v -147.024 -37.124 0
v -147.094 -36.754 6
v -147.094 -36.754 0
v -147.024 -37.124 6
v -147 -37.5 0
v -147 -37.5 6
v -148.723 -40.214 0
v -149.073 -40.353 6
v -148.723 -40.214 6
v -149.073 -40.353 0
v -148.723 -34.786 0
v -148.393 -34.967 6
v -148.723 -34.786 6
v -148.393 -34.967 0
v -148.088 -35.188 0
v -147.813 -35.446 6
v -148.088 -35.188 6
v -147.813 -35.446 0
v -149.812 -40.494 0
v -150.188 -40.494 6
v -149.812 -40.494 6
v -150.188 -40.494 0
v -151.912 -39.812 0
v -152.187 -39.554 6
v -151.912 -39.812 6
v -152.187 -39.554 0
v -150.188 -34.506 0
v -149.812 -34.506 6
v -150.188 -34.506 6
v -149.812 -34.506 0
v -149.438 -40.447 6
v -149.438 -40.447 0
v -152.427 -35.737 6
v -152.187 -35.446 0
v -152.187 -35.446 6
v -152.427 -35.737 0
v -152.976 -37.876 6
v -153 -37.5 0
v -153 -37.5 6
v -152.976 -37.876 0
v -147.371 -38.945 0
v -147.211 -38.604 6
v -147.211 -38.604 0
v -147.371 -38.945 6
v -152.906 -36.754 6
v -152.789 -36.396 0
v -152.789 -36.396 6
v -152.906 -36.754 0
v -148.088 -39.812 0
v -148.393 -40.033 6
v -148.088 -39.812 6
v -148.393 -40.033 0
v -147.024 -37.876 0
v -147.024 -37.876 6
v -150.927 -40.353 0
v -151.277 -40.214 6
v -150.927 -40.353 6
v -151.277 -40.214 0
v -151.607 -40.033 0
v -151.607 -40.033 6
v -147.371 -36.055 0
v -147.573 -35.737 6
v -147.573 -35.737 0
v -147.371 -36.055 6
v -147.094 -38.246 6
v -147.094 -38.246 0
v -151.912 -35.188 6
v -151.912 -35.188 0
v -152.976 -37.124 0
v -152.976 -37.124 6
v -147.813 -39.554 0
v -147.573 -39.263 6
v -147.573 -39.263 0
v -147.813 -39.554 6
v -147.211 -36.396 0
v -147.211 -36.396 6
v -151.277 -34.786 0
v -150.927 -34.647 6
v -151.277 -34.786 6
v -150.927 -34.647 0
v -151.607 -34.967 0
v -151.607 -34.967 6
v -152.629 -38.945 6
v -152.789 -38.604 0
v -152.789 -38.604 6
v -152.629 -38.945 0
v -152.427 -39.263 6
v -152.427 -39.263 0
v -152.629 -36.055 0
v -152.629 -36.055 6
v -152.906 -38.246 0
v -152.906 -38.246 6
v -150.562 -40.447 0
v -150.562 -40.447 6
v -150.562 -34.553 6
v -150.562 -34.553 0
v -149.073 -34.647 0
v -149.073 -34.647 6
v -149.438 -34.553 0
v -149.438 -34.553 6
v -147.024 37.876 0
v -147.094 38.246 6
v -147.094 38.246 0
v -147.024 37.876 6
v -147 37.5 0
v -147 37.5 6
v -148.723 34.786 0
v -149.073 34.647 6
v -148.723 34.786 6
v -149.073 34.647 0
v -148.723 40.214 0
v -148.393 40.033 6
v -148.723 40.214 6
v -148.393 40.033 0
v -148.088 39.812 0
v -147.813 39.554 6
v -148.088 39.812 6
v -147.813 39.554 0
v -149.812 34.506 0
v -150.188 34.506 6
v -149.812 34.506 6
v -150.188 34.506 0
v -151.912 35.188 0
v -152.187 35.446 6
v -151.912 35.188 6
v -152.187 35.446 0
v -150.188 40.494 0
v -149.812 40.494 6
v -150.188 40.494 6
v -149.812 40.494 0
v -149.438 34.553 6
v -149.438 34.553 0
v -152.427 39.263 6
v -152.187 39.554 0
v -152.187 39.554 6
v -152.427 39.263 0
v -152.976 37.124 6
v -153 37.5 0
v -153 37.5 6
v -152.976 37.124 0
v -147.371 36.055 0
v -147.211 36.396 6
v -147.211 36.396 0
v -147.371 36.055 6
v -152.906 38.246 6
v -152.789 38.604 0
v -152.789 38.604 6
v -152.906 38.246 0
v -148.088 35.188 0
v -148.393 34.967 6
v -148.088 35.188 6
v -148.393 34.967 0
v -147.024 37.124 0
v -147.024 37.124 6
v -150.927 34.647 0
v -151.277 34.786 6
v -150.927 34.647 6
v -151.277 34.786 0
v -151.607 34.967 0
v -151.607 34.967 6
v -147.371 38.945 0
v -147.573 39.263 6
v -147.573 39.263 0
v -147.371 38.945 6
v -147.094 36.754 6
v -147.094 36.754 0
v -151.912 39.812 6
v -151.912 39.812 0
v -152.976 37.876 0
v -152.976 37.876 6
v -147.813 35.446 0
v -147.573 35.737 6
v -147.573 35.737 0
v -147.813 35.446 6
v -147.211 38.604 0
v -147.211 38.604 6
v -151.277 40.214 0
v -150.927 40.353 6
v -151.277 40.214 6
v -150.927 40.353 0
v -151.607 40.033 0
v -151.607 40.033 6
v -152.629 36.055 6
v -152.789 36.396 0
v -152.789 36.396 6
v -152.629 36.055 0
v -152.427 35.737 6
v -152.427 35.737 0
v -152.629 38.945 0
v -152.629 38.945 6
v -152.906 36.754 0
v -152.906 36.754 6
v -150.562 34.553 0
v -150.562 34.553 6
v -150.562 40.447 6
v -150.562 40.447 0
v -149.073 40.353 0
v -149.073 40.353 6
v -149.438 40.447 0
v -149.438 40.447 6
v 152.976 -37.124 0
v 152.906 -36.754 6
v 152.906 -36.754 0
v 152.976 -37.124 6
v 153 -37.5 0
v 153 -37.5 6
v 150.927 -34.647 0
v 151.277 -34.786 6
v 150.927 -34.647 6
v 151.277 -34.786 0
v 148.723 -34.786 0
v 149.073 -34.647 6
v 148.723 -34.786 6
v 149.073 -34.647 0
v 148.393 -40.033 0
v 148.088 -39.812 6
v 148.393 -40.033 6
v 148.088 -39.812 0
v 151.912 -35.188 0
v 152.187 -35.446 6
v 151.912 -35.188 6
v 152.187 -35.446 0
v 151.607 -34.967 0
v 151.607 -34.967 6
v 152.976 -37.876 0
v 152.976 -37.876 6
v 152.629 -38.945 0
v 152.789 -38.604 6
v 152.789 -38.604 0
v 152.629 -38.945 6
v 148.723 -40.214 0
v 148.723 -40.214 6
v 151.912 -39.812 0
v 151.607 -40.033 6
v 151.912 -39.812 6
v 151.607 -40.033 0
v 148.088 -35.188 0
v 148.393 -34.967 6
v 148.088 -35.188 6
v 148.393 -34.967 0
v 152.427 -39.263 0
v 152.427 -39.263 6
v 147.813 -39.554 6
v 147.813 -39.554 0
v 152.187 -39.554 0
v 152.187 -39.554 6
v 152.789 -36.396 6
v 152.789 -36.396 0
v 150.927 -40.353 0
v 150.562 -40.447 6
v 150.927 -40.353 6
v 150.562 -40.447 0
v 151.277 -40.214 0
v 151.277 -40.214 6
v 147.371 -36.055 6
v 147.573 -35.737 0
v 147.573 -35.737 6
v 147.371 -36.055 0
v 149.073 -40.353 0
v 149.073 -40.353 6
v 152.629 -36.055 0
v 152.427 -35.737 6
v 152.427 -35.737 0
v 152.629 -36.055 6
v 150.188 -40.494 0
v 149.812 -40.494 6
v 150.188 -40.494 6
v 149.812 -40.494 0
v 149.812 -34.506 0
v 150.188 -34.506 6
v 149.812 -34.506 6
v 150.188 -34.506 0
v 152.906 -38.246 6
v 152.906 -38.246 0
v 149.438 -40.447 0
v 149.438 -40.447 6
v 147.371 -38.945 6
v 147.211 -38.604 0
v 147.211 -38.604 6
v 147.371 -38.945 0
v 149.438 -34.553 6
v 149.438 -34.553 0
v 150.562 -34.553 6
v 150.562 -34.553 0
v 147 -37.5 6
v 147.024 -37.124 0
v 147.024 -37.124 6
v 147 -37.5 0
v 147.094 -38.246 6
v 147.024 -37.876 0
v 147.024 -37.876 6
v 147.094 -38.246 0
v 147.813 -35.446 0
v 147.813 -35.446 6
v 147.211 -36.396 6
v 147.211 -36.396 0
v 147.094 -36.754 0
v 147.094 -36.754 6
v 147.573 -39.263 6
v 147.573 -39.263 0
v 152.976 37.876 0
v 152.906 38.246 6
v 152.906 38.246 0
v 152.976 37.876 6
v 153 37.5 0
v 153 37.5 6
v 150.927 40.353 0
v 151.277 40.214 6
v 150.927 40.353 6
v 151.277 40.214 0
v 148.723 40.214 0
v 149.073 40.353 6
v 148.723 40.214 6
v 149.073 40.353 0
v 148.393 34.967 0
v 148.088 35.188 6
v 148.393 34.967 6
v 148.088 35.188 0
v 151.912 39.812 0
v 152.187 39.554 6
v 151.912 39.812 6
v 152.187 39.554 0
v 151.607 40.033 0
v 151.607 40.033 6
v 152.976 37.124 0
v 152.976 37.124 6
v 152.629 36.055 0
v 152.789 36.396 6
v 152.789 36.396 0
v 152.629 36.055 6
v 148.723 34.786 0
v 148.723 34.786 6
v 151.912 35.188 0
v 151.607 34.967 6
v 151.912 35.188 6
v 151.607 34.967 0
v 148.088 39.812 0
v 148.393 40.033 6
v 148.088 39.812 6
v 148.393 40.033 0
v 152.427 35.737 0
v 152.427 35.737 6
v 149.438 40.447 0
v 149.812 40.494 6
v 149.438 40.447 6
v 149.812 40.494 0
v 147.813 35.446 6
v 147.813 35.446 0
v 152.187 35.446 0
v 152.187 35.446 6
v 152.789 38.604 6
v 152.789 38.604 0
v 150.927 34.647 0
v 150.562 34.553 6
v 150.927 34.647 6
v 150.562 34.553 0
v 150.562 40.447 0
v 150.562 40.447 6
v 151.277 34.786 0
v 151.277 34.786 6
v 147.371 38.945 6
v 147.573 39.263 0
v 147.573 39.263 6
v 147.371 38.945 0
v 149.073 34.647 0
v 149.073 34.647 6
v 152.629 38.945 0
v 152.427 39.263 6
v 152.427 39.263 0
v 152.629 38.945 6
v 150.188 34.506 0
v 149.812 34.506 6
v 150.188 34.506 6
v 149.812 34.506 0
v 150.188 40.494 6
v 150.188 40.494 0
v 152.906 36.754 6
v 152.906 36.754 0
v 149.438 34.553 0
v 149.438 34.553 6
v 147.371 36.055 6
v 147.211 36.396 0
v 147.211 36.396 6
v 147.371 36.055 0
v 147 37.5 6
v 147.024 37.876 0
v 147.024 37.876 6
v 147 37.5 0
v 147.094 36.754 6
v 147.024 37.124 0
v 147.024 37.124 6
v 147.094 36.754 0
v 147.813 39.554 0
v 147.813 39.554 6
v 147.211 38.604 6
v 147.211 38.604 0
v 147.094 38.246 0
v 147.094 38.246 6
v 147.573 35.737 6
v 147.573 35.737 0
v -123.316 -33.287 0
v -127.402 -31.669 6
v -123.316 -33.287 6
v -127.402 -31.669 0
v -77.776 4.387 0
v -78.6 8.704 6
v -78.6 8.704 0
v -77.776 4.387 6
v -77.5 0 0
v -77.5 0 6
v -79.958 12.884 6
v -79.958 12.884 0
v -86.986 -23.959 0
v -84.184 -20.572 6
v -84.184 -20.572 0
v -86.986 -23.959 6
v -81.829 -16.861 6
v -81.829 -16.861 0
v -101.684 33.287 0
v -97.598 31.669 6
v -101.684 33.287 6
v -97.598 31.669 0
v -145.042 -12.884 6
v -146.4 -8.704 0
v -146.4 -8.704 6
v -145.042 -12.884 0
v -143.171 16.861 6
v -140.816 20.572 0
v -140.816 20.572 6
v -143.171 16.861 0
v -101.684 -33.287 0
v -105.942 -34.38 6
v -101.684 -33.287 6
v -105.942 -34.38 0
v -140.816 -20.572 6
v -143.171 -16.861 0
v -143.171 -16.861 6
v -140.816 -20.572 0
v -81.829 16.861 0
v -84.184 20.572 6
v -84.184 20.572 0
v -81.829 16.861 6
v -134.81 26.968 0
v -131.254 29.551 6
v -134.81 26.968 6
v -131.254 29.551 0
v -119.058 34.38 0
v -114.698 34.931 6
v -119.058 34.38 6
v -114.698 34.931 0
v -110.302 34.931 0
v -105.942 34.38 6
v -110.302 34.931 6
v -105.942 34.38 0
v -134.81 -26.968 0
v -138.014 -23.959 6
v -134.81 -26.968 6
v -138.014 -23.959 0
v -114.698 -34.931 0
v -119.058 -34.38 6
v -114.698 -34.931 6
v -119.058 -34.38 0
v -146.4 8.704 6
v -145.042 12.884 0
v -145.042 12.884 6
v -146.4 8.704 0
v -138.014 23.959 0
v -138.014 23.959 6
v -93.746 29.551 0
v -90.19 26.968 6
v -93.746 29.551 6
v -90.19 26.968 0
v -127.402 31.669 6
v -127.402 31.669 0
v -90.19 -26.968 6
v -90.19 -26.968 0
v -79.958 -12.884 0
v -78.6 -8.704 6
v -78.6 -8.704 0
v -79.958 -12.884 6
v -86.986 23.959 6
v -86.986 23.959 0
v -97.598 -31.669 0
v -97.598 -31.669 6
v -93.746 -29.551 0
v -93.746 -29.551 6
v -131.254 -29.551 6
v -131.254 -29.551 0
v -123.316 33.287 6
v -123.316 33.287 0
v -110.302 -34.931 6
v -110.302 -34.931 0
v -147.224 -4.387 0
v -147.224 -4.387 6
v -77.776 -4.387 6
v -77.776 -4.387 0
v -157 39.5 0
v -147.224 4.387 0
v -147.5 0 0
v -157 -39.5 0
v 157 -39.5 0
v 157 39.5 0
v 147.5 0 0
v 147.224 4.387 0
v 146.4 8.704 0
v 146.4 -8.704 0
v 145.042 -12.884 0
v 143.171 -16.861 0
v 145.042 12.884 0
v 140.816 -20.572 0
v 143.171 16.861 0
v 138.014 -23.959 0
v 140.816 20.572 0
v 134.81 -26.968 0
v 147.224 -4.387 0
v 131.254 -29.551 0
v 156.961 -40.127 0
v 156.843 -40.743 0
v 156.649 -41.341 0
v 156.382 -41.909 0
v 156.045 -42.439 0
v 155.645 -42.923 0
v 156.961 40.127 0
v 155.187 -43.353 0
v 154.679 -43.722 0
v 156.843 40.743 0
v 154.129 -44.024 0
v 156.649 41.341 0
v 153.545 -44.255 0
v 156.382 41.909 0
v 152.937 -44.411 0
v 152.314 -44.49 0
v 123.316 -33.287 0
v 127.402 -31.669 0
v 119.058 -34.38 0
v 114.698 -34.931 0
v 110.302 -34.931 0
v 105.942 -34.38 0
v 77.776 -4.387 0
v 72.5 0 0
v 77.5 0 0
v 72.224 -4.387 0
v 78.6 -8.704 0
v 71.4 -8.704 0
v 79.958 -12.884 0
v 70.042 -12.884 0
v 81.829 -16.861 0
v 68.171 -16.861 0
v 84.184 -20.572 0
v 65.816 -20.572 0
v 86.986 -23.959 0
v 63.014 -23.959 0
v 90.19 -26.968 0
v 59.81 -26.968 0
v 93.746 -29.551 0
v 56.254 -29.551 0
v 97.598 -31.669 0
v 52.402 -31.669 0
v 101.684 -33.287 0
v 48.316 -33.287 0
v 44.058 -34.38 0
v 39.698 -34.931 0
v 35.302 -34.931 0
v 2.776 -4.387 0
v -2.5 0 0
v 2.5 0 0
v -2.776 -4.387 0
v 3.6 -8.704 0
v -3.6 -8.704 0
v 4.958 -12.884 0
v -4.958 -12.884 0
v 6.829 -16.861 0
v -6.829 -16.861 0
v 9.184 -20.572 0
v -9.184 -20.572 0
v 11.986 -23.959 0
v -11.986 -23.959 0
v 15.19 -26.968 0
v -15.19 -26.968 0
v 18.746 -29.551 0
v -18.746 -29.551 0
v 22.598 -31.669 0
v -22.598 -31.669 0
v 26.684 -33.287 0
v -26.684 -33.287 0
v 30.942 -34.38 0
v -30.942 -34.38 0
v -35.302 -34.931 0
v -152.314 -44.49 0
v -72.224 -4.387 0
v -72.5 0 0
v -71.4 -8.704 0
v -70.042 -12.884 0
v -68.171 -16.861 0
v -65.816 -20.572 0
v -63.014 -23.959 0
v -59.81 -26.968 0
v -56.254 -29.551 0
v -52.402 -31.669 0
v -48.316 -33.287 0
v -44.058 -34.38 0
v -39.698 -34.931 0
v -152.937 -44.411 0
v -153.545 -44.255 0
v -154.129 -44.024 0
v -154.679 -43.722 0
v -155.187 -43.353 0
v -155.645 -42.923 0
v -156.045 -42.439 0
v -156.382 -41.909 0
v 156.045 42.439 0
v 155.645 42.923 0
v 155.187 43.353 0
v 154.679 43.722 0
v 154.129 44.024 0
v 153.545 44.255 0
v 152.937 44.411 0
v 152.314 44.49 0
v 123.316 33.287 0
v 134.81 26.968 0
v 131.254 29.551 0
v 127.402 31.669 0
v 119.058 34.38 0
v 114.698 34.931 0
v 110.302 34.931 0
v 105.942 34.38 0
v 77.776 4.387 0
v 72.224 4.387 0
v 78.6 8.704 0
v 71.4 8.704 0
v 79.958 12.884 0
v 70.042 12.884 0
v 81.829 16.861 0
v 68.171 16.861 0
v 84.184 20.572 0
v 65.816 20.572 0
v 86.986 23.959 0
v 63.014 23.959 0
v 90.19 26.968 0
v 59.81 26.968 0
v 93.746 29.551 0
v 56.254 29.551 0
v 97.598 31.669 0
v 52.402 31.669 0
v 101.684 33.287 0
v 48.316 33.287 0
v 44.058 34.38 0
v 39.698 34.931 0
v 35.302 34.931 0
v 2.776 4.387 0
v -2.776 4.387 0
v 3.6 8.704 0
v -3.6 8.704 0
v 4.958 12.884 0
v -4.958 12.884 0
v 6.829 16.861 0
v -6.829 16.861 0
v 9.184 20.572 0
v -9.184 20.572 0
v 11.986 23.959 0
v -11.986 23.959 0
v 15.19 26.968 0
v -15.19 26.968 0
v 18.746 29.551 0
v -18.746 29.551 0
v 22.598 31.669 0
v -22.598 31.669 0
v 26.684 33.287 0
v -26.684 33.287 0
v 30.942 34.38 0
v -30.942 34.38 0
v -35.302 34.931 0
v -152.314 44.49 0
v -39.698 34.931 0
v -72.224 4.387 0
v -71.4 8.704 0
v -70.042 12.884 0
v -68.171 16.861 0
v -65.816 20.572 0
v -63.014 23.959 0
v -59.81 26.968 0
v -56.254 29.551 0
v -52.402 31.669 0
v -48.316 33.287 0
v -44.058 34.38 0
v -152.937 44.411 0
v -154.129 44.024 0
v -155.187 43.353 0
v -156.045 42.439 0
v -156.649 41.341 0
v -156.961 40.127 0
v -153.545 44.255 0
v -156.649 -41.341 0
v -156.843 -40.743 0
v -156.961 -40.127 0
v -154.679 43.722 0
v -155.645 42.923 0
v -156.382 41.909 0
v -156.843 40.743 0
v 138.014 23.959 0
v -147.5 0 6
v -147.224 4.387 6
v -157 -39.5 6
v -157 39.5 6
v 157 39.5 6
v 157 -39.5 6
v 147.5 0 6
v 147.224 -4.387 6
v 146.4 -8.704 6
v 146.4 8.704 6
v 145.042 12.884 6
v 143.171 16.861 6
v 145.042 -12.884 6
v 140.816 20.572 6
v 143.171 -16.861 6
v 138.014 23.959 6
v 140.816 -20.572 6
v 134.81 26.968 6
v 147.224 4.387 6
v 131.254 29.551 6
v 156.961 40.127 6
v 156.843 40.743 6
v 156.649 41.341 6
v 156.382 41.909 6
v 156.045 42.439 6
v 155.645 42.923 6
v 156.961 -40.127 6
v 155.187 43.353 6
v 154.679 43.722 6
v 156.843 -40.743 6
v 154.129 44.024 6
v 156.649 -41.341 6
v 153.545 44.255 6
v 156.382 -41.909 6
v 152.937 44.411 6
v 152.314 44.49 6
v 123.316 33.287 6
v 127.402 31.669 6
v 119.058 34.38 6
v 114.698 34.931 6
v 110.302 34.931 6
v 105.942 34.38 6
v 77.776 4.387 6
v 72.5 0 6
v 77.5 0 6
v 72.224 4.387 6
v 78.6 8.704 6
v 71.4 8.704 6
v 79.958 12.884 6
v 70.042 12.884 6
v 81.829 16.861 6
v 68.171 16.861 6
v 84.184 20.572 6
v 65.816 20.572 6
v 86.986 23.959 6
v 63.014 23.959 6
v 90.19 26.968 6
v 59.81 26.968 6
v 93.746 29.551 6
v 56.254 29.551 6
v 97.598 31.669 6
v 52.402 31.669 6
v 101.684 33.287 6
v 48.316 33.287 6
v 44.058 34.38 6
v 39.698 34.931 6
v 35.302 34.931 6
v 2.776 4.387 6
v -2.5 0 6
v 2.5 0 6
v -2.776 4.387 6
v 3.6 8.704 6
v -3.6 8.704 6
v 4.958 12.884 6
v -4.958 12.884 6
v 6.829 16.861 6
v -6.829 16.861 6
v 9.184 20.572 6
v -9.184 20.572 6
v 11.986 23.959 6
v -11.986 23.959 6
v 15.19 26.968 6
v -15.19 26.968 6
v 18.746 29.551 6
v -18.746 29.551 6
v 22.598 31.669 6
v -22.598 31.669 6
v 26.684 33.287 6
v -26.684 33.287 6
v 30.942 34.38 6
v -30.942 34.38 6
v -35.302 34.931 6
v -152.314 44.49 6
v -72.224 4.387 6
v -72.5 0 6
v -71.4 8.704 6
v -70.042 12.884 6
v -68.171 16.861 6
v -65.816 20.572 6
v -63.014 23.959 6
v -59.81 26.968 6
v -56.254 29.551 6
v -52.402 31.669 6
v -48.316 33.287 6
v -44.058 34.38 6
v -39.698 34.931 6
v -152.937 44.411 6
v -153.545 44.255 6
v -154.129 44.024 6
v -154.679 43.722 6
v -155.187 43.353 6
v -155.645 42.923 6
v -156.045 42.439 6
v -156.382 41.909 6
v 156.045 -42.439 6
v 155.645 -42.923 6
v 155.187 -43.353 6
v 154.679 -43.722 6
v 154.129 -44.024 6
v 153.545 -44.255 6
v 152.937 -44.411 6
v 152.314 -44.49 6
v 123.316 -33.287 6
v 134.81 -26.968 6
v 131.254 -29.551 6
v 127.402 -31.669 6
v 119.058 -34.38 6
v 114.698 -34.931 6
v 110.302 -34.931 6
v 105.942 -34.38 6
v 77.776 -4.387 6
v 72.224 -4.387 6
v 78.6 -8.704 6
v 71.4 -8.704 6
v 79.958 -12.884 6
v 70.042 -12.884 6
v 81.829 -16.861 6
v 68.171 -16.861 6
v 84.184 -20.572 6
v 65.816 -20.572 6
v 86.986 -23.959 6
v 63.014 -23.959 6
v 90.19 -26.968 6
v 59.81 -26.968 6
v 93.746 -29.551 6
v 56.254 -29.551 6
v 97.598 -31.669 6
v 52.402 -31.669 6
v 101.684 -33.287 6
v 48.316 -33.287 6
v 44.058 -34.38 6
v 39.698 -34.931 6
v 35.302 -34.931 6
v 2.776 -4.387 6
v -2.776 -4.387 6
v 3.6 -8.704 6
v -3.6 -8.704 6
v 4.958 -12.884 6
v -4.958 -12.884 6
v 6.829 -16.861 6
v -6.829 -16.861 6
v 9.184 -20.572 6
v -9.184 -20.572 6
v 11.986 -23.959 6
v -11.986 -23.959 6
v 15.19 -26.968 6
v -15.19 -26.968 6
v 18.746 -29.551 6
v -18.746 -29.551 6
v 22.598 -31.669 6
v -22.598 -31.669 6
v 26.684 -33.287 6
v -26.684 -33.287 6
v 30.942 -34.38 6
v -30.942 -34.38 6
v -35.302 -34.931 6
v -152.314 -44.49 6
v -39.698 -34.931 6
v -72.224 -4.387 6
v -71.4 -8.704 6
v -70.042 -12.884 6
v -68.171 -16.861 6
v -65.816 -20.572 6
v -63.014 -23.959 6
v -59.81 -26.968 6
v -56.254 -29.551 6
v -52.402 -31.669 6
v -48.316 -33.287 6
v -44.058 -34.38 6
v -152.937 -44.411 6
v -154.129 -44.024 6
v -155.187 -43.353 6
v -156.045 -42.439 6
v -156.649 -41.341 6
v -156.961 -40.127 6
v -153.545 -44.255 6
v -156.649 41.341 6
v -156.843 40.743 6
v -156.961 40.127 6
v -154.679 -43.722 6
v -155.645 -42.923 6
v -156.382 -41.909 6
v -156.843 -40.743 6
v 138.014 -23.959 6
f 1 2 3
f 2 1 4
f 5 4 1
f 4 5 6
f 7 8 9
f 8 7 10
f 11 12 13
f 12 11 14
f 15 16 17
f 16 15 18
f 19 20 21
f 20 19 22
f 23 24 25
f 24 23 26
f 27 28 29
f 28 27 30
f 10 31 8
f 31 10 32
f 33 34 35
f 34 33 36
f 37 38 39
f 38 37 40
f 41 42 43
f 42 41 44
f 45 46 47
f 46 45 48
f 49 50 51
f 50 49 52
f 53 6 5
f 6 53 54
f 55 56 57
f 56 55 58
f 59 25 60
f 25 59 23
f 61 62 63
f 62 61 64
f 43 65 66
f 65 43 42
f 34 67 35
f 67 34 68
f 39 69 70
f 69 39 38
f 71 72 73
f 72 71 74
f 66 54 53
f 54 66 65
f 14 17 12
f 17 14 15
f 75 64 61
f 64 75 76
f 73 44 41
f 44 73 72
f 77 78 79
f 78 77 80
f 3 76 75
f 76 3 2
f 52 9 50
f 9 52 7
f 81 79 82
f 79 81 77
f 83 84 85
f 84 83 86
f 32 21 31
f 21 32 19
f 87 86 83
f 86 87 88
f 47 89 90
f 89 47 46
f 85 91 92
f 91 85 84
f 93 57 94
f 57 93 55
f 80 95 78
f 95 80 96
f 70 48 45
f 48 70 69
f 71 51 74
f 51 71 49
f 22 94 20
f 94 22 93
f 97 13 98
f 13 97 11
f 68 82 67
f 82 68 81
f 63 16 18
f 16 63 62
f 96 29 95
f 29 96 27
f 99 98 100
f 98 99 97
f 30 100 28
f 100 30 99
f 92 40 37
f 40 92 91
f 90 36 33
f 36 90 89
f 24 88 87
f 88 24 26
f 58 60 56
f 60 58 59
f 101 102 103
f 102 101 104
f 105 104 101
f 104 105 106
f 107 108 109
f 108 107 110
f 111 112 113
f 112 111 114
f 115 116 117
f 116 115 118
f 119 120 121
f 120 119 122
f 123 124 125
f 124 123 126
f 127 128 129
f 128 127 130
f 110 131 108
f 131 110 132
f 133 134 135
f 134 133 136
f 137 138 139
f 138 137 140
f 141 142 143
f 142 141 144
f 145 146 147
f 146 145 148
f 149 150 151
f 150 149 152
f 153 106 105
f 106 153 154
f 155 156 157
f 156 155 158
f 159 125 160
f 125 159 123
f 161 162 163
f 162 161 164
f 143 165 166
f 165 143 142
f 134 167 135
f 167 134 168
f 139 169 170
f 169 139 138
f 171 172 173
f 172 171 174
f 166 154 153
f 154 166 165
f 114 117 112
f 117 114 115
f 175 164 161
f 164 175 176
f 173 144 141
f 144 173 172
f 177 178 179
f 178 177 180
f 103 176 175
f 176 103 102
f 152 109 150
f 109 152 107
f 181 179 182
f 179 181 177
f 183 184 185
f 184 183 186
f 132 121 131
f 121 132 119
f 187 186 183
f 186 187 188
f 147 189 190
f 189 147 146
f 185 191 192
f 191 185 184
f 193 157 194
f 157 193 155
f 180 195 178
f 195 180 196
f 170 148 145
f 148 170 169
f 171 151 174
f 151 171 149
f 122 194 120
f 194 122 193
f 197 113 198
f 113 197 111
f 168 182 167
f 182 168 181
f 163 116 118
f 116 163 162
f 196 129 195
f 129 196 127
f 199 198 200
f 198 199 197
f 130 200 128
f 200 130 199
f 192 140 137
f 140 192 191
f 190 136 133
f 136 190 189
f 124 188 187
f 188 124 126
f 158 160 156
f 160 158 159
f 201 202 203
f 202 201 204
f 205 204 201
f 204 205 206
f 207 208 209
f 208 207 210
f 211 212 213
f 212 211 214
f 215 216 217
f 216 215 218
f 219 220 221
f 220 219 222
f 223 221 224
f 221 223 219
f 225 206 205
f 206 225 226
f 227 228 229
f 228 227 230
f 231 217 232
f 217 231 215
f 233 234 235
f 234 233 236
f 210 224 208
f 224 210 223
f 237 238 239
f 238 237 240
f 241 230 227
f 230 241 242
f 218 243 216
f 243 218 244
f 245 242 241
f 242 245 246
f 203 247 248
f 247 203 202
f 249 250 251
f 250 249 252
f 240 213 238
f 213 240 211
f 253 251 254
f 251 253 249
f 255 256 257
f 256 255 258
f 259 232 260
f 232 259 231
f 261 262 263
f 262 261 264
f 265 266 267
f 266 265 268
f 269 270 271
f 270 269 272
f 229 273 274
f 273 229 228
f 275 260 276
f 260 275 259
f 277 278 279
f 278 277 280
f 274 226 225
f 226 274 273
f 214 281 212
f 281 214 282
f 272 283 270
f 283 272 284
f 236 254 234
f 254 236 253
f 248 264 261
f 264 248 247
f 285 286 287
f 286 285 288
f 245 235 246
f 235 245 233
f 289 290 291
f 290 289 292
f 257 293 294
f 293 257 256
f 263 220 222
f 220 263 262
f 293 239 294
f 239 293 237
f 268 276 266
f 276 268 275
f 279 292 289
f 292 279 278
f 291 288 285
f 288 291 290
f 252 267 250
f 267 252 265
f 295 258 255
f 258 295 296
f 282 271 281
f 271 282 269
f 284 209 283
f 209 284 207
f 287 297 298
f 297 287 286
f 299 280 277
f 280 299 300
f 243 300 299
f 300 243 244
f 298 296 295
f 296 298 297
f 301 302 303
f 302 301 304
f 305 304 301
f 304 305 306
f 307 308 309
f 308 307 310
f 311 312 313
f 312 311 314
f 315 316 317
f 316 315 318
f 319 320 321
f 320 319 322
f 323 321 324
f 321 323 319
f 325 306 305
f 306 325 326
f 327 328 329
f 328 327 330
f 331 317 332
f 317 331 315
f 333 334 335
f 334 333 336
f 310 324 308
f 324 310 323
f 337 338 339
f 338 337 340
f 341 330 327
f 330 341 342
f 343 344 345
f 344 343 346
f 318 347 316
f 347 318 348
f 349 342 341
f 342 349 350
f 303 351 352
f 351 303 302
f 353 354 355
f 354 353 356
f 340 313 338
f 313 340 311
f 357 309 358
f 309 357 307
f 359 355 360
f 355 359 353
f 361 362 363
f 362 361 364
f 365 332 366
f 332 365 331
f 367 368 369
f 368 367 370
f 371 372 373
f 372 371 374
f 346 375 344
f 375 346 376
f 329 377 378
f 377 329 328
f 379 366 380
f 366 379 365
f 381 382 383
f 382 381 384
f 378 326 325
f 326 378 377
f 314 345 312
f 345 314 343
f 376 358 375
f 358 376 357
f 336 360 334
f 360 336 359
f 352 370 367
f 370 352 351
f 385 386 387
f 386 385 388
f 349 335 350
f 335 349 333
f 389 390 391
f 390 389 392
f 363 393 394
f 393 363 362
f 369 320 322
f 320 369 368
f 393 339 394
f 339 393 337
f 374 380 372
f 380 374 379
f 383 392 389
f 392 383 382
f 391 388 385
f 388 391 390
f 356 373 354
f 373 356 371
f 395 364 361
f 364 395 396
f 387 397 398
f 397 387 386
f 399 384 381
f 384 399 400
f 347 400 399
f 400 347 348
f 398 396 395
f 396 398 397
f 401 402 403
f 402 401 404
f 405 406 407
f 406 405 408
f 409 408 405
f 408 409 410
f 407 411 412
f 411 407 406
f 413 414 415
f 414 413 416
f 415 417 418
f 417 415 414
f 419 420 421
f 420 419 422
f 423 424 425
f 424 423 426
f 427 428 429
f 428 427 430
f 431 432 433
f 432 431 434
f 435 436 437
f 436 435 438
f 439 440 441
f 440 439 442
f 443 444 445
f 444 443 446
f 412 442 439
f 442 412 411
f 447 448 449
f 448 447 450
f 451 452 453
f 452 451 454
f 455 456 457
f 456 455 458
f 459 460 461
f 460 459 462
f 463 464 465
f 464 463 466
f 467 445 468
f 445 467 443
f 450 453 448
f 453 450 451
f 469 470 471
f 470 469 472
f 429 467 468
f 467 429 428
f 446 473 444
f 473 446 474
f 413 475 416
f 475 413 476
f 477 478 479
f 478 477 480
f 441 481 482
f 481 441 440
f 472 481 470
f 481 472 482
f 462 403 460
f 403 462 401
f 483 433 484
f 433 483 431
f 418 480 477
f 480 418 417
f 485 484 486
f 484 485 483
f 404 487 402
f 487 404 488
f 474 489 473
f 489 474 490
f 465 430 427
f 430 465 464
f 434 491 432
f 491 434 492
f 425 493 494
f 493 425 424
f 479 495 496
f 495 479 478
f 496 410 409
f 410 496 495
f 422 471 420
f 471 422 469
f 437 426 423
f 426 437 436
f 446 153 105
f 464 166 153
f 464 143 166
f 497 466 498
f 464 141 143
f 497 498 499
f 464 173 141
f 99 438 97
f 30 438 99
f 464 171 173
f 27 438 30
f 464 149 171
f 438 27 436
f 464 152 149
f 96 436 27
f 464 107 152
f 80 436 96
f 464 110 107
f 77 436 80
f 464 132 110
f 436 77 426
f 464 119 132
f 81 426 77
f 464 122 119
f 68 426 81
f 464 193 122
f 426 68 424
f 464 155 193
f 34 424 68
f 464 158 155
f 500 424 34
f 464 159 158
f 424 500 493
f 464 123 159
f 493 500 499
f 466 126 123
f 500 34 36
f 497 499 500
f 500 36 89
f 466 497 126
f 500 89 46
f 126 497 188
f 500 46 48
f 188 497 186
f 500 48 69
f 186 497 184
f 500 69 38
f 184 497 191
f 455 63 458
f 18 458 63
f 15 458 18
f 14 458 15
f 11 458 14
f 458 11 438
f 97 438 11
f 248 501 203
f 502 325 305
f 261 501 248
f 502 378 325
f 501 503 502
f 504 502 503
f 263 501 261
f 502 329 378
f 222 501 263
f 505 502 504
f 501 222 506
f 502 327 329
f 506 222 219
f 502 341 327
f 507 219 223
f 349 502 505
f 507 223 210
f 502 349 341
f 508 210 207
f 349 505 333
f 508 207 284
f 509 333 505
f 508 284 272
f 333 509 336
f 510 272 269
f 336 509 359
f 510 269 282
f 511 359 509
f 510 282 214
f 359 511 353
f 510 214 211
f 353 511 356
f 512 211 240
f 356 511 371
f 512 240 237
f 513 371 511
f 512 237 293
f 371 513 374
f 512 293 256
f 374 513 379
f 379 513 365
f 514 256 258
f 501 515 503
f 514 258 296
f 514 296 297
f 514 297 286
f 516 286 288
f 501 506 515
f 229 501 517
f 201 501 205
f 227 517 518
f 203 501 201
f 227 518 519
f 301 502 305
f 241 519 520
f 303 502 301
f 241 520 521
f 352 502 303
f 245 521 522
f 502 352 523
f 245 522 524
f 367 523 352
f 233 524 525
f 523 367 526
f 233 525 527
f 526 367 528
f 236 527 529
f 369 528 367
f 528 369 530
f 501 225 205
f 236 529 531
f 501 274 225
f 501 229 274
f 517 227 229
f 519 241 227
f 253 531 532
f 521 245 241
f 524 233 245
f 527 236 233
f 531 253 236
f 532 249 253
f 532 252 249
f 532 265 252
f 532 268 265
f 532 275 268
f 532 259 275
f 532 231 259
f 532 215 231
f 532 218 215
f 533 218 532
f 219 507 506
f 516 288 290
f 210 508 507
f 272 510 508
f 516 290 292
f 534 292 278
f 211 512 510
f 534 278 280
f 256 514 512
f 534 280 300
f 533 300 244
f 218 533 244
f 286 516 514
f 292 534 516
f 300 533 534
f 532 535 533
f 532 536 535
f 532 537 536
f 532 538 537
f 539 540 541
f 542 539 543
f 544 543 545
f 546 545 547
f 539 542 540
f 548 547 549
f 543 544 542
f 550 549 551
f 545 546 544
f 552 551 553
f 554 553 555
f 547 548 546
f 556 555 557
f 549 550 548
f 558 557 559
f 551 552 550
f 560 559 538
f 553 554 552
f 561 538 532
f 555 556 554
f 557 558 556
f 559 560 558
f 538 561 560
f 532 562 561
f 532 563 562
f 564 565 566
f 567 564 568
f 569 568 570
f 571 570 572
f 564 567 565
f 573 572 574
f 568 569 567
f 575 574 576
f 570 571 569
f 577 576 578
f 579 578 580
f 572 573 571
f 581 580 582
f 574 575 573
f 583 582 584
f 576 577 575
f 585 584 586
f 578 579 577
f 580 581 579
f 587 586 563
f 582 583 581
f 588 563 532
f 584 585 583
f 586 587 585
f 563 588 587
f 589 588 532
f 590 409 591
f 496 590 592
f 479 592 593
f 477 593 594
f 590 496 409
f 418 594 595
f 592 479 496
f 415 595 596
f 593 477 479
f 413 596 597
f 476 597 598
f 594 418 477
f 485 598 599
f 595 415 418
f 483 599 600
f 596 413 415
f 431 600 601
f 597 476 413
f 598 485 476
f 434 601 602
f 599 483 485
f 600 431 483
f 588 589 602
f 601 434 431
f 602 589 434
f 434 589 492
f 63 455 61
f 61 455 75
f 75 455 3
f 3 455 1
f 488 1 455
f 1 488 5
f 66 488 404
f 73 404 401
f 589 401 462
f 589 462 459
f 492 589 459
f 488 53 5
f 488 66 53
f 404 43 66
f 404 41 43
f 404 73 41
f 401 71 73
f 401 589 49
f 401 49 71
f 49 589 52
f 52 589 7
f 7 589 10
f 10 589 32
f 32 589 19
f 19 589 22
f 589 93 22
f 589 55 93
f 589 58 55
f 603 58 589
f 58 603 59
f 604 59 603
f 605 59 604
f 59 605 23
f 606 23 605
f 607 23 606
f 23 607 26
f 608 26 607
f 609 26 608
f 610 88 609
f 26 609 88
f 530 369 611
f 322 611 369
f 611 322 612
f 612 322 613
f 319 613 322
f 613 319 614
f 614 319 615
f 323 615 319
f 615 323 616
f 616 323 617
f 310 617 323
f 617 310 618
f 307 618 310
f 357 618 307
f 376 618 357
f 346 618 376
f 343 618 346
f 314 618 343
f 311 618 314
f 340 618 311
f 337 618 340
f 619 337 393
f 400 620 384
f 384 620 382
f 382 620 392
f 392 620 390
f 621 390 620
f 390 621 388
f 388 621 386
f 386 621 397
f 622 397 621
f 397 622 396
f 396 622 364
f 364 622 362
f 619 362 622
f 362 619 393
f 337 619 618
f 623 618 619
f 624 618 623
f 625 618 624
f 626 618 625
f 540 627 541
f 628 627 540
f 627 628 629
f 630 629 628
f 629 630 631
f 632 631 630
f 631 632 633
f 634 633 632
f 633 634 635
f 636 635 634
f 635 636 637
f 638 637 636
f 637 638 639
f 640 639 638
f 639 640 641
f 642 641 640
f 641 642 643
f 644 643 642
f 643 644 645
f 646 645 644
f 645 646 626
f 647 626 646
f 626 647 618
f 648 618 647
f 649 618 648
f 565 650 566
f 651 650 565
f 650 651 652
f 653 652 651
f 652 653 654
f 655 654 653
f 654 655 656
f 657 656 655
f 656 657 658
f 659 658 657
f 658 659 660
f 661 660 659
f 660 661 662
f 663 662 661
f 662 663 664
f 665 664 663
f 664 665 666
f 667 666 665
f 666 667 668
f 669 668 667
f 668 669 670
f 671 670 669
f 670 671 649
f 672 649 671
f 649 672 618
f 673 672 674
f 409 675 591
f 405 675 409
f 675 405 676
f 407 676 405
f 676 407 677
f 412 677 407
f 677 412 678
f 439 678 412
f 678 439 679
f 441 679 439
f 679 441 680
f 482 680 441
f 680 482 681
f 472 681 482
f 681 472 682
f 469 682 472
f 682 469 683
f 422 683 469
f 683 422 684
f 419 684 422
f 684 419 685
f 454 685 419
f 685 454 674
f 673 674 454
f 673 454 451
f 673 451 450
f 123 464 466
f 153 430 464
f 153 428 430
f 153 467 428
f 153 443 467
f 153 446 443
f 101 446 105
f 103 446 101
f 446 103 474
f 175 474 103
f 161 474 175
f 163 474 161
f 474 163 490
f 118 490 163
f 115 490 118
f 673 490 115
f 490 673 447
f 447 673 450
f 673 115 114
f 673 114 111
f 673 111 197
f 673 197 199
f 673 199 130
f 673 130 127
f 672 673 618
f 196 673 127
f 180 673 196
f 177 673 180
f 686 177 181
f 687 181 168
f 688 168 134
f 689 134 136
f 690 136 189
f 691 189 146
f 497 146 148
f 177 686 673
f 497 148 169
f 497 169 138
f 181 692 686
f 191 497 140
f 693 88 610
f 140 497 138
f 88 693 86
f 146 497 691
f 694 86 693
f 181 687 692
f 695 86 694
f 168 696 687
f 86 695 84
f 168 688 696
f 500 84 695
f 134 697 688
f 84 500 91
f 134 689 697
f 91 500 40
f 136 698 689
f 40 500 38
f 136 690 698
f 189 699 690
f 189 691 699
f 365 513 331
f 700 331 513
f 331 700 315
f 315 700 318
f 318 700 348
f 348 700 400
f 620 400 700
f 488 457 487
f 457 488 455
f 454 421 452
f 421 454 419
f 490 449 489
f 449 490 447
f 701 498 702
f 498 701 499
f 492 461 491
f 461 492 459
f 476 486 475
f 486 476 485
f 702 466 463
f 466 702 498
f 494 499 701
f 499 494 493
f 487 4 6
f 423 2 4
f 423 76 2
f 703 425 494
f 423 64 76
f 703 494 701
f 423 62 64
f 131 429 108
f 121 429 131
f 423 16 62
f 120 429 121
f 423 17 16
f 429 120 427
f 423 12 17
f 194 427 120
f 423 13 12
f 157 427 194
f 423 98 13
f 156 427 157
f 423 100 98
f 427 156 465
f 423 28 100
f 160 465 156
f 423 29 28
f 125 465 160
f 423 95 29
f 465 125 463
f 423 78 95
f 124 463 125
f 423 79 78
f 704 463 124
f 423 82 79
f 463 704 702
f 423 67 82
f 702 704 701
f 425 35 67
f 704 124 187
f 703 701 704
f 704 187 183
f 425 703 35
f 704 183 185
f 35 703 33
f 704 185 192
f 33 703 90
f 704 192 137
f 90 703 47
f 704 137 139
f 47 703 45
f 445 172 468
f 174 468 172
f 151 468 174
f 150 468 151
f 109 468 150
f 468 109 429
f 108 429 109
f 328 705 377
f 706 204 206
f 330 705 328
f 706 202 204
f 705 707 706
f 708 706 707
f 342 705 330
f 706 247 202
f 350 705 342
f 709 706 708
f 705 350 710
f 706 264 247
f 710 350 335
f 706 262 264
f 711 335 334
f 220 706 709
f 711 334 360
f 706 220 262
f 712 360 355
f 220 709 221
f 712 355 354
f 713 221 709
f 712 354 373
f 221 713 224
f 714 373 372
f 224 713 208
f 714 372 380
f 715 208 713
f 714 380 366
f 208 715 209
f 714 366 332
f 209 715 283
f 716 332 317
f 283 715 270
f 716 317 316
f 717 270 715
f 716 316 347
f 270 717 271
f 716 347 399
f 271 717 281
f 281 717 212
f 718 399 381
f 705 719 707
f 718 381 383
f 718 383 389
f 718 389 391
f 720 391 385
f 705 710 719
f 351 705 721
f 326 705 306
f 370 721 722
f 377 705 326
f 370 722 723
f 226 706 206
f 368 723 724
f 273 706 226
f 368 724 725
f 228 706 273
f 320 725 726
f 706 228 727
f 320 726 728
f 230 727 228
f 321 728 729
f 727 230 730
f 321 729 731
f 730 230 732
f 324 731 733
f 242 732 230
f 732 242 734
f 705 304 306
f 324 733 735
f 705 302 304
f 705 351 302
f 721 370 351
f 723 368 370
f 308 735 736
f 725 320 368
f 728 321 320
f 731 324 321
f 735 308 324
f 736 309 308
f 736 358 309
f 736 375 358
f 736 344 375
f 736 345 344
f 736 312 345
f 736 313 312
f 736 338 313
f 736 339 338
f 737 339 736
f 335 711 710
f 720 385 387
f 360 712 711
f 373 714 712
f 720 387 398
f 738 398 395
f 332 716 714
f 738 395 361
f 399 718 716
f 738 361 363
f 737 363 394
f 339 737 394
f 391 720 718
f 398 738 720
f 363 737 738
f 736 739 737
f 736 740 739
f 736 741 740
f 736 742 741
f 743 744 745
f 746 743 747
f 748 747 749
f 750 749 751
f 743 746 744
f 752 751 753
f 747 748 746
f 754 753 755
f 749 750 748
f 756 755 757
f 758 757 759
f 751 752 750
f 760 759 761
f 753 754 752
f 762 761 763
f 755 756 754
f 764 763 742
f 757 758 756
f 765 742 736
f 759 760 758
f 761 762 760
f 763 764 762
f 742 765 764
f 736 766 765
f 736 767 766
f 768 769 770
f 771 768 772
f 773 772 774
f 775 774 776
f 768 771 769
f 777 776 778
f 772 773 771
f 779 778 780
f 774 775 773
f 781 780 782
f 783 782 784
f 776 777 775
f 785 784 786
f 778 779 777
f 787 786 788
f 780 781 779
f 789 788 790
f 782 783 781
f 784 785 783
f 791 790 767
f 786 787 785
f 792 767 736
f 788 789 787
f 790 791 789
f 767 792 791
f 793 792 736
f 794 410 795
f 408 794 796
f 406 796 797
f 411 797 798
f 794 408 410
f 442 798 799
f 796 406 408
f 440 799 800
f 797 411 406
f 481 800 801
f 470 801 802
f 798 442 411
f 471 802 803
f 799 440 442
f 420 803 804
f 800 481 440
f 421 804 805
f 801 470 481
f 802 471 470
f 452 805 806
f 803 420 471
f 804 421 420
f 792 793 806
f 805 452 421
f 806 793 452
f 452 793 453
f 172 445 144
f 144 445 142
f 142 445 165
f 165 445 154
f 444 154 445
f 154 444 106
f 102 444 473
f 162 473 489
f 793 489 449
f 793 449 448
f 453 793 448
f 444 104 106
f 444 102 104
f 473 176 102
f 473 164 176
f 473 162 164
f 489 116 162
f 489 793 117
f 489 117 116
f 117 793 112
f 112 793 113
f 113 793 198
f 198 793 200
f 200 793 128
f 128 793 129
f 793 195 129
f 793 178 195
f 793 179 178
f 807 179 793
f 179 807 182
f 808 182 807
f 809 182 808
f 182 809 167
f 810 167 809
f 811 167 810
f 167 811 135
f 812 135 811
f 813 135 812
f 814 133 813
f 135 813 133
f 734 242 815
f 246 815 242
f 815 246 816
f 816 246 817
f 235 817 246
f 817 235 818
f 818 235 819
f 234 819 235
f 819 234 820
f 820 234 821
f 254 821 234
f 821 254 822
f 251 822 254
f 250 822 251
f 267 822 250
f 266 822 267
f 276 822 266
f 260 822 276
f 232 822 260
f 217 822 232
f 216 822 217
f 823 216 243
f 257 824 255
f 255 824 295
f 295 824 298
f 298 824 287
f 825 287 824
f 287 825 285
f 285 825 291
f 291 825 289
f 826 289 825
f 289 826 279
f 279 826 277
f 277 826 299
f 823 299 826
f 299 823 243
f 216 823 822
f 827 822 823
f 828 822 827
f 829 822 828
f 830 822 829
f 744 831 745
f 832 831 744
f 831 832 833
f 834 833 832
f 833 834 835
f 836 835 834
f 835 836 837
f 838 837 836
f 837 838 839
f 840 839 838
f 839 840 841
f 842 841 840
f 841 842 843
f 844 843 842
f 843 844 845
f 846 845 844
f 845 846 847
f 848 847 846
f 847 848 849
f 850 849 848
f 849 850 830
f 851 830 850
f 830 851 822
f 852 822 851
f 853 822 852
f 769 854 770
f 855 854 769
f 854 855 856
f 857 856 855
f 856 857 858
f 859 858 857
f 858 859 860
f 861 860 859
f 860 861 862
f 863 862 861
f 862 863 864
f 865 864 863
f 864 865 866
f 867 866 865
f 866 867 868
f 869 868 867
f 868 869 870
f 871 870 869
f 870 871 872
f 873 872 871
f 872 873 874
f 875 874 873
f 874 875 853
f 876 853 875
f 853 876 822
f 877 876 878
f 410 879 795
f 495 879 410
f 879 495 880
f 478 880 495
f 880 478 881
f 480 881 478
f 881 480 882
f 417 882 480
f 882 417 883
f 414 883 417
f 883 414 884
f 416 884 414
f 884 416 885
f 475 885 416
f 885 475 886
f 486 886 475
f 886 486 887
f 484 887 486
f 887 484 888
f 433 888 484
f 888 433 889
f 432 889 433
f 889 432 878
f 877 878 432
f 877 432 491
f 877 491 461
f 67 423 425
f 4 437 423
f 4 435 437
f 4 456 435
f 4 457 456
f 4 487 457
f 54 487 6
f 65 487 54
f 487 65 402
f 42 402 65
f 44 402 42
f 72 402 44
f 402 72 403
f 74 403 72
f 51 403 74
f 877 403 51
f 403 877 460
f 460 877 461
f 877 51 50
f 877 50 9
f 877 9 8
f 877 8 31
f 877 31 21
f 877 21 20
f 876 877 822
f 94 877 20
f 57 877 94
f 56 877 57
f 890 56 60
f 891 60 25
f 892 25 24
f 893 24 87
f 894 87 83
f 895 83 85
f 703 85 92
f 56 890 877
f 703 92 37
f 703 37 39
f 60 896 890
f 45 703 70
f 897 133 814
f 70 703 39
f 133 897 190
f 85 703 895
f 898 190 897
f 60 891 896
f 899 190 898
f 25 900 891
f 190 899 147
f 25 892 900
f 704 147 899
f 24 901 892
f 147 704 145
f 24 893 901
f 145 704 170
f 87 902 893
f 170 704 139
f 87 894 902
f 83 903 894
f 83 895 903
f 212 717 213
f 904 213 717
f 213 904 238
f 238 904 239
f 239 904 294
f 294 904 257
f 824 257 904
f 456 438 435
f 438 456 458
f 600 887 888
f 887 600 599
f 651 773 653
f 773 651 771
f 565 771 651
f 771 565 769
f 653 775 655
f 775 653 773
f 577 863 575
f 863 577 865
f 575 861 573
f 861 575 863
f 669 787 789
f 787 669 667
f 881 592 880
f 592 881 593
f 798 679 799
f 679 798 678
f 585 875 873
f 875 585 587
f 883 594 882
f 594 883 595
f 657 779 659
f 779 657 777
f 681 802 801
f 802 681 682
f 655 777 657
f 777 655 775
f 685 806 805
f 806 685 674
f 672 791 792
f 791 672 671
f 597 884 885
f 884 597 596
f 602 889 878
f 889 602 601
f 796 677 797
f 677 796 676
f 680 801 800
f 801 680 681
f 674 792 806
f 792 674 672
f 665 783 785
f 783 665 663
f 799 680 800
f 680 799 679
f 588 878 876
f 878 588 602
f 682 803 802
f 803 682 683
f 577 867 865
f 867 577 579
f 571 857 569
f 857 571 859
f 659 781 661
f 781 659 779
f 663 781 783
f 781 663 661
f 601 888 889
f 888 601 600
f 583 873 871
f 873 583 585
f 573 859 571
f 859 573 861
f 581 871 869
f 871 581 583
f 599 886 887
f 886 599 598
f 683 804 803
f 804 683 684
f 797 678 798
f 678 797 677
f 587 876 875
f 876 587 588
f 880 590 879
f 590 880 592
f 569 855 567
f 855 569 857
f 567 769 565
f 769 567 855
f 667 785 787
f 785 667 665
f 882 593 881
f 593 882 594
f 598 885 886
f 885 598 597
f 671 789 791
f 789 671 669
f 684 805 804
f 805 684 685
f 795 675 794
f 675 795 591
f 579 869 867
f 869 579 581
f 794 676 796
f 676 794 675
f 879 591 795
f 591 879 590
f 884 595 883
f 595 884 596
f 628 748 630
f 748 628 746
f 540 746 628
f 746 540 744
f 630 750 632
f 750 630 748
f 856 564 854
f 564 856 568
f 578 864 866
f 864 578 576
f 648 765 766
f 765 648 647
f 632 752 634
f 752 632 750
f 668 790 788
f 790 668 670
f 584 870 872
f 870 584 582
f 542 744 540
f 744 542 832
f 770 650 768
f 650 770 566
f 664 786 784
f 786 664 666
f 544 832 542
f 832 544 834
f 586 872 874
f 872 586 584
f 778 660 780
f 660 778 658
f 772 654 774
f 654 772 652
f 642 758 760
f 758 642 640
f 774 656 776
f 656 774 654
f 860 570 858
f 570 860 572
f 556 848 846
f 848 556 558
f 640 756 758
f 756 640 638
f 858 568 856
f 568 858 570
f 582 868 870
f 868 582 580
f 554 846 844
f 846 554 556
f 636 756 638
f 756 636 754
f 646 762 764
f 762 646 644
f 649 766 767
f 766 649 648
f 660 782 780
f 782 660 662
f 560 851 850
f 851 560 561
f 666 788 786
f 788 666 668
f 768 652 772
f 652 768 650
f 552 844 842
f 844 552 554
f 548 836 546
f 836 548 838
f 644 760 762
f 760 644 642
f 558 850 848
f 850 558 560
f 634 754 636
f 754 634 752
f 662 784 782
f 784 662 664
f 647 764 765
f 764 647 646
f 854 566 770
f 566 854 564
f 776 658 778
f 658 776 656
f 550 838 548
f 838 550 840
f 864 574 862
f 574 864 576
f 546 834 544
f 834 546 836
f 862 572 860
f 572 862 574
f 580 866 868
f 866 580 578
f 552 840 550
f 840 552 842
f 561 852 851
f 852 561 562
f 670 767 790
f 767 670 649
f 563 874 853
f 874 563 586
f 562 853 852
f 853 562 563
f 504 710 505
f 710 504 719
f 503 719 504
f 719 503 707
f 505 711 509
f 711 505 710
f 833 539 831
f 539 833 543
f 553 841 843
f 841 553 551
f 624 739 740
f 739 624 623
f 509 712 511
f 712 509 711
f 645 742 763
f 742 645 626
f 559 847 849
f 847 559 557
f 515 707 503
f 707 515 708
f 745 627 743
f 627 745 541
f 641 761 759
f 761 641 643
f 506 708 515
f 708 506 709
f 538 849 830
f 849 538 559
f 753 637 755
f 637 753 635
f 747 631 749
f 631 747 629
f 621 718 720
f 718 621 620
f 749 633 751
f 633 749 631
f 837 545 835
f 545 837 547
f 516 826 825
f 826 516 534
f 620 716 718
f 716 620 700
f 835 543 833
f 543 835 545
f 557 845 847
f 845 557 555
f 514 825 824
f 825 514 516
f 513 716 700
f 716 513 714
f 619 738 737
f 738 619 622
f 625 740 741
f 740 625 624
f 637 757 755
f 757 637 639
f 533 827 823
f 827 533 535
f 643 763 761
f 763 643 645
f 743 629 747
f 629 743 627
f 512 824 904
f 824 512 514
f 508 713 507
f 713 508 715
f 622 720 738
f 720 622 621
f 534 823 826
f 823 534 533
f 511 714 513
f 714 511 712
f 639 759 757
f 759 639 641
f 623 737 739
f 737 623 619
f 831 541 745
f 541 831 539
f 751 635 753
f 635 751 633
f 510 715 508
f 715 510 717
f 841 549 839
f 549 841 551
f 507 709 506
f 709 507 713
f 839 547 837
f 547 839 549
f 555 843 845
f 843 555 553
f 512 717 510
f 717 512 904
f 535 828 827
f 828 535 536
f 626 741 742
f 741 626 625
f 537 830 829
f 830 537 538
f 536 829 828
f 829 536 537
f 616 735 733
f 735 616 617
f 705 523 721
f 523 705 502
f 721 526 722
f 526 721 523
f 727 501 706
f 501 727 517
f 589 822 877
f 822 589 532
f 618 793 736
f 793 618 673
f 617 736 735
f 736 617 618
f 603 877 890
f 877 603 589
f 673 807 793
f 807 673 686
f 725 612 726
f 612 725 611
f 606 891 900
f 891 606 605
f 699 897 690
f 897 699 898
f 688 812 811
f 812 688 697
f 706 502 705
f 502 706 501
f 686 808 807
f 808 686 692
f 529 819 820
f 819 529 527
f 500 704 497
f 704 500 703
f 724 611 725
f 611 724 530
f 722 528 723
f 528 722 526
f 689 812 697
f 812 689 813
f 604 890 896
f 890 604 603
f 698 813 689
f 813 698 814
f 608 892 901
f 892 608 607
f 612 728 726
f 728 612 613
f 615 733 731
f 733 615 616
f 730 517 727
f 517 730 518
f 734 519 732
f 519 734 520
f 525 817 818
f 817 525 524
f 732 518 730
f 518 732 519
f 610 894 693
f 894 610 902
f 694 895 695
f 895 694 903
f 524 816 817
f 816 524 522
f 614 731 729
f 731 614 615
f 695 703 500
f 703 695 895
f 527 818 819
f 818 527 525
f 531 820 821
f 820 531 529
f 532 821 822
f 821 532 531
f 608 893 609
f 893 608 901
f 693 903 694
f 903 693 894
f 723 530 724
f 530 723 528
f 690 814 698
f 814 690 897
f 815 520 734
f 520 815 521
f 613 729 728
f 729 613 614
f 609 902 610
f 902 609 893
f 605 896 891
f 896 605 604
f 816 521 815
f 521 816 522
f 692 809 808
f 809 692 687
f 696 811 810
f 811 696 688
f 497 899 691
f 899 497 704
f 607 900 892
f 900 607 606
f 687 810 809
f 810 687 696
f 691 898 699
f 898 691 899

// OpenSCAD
$fn = 50;


difference() {
	union() {
		hull() {
			translate(v = [-152.0000000000, 39.5000000000, 0]) {
				cylinder(h = 6, r = 5);
			}
			translate(v = [152.0000000000, 39.5000000000, 0]) {
				cylinder(h = 6, r = 5);
			}
			translate(v = [-152.0000000000, -39.5000000000, 0]) {
				cylinder(h = 6, r = 5);
			}
			translate(v = [152.0000000000, -39.5000000000, 0]) {
				cylinder(h = 6, r = 5);
			}
		}
	}
	union() {
		#translate(v = [-150.0000000000, -37.5000000000, -100.0000000000]) {
			cylinder(h = 200, r = 3.0000000000);
		}
		#translate(v = [-150.0000000000, 37.5000000000, -100.0000000000]) {
			cylinder(h = 200, r = 3.0000000000);
		}
		#translate(v = [150.0000000000, -37.5000000000, -100.0000000000]) {
			cylinder(h = 200, r = 3.0000000000);
		}
		#translate(v = [150.0000000000, 37.5000000000, -100.0000000000]) {
			cylinder(h = 200, r = 3.0000000000);
		}
		#translate(v = [-112.5000000000, 0, 0]) {
			cylinder(h = 6, r = 35.0000000000);
		}
		#translate(v = [-37.5000000000, 0, 0]) {
			cylinder(h = 6, r = 35.0000000000);
		}
		#translate(v = [37.5000000000, 0, 0]) {
			cylinder(h = 6, r = 35.0000000000);
		}
		#translate(v = [112.5000000000, 0, 0]) {
			cylinder(h = 6, r = 35.0000000000);
		}
	}
}
